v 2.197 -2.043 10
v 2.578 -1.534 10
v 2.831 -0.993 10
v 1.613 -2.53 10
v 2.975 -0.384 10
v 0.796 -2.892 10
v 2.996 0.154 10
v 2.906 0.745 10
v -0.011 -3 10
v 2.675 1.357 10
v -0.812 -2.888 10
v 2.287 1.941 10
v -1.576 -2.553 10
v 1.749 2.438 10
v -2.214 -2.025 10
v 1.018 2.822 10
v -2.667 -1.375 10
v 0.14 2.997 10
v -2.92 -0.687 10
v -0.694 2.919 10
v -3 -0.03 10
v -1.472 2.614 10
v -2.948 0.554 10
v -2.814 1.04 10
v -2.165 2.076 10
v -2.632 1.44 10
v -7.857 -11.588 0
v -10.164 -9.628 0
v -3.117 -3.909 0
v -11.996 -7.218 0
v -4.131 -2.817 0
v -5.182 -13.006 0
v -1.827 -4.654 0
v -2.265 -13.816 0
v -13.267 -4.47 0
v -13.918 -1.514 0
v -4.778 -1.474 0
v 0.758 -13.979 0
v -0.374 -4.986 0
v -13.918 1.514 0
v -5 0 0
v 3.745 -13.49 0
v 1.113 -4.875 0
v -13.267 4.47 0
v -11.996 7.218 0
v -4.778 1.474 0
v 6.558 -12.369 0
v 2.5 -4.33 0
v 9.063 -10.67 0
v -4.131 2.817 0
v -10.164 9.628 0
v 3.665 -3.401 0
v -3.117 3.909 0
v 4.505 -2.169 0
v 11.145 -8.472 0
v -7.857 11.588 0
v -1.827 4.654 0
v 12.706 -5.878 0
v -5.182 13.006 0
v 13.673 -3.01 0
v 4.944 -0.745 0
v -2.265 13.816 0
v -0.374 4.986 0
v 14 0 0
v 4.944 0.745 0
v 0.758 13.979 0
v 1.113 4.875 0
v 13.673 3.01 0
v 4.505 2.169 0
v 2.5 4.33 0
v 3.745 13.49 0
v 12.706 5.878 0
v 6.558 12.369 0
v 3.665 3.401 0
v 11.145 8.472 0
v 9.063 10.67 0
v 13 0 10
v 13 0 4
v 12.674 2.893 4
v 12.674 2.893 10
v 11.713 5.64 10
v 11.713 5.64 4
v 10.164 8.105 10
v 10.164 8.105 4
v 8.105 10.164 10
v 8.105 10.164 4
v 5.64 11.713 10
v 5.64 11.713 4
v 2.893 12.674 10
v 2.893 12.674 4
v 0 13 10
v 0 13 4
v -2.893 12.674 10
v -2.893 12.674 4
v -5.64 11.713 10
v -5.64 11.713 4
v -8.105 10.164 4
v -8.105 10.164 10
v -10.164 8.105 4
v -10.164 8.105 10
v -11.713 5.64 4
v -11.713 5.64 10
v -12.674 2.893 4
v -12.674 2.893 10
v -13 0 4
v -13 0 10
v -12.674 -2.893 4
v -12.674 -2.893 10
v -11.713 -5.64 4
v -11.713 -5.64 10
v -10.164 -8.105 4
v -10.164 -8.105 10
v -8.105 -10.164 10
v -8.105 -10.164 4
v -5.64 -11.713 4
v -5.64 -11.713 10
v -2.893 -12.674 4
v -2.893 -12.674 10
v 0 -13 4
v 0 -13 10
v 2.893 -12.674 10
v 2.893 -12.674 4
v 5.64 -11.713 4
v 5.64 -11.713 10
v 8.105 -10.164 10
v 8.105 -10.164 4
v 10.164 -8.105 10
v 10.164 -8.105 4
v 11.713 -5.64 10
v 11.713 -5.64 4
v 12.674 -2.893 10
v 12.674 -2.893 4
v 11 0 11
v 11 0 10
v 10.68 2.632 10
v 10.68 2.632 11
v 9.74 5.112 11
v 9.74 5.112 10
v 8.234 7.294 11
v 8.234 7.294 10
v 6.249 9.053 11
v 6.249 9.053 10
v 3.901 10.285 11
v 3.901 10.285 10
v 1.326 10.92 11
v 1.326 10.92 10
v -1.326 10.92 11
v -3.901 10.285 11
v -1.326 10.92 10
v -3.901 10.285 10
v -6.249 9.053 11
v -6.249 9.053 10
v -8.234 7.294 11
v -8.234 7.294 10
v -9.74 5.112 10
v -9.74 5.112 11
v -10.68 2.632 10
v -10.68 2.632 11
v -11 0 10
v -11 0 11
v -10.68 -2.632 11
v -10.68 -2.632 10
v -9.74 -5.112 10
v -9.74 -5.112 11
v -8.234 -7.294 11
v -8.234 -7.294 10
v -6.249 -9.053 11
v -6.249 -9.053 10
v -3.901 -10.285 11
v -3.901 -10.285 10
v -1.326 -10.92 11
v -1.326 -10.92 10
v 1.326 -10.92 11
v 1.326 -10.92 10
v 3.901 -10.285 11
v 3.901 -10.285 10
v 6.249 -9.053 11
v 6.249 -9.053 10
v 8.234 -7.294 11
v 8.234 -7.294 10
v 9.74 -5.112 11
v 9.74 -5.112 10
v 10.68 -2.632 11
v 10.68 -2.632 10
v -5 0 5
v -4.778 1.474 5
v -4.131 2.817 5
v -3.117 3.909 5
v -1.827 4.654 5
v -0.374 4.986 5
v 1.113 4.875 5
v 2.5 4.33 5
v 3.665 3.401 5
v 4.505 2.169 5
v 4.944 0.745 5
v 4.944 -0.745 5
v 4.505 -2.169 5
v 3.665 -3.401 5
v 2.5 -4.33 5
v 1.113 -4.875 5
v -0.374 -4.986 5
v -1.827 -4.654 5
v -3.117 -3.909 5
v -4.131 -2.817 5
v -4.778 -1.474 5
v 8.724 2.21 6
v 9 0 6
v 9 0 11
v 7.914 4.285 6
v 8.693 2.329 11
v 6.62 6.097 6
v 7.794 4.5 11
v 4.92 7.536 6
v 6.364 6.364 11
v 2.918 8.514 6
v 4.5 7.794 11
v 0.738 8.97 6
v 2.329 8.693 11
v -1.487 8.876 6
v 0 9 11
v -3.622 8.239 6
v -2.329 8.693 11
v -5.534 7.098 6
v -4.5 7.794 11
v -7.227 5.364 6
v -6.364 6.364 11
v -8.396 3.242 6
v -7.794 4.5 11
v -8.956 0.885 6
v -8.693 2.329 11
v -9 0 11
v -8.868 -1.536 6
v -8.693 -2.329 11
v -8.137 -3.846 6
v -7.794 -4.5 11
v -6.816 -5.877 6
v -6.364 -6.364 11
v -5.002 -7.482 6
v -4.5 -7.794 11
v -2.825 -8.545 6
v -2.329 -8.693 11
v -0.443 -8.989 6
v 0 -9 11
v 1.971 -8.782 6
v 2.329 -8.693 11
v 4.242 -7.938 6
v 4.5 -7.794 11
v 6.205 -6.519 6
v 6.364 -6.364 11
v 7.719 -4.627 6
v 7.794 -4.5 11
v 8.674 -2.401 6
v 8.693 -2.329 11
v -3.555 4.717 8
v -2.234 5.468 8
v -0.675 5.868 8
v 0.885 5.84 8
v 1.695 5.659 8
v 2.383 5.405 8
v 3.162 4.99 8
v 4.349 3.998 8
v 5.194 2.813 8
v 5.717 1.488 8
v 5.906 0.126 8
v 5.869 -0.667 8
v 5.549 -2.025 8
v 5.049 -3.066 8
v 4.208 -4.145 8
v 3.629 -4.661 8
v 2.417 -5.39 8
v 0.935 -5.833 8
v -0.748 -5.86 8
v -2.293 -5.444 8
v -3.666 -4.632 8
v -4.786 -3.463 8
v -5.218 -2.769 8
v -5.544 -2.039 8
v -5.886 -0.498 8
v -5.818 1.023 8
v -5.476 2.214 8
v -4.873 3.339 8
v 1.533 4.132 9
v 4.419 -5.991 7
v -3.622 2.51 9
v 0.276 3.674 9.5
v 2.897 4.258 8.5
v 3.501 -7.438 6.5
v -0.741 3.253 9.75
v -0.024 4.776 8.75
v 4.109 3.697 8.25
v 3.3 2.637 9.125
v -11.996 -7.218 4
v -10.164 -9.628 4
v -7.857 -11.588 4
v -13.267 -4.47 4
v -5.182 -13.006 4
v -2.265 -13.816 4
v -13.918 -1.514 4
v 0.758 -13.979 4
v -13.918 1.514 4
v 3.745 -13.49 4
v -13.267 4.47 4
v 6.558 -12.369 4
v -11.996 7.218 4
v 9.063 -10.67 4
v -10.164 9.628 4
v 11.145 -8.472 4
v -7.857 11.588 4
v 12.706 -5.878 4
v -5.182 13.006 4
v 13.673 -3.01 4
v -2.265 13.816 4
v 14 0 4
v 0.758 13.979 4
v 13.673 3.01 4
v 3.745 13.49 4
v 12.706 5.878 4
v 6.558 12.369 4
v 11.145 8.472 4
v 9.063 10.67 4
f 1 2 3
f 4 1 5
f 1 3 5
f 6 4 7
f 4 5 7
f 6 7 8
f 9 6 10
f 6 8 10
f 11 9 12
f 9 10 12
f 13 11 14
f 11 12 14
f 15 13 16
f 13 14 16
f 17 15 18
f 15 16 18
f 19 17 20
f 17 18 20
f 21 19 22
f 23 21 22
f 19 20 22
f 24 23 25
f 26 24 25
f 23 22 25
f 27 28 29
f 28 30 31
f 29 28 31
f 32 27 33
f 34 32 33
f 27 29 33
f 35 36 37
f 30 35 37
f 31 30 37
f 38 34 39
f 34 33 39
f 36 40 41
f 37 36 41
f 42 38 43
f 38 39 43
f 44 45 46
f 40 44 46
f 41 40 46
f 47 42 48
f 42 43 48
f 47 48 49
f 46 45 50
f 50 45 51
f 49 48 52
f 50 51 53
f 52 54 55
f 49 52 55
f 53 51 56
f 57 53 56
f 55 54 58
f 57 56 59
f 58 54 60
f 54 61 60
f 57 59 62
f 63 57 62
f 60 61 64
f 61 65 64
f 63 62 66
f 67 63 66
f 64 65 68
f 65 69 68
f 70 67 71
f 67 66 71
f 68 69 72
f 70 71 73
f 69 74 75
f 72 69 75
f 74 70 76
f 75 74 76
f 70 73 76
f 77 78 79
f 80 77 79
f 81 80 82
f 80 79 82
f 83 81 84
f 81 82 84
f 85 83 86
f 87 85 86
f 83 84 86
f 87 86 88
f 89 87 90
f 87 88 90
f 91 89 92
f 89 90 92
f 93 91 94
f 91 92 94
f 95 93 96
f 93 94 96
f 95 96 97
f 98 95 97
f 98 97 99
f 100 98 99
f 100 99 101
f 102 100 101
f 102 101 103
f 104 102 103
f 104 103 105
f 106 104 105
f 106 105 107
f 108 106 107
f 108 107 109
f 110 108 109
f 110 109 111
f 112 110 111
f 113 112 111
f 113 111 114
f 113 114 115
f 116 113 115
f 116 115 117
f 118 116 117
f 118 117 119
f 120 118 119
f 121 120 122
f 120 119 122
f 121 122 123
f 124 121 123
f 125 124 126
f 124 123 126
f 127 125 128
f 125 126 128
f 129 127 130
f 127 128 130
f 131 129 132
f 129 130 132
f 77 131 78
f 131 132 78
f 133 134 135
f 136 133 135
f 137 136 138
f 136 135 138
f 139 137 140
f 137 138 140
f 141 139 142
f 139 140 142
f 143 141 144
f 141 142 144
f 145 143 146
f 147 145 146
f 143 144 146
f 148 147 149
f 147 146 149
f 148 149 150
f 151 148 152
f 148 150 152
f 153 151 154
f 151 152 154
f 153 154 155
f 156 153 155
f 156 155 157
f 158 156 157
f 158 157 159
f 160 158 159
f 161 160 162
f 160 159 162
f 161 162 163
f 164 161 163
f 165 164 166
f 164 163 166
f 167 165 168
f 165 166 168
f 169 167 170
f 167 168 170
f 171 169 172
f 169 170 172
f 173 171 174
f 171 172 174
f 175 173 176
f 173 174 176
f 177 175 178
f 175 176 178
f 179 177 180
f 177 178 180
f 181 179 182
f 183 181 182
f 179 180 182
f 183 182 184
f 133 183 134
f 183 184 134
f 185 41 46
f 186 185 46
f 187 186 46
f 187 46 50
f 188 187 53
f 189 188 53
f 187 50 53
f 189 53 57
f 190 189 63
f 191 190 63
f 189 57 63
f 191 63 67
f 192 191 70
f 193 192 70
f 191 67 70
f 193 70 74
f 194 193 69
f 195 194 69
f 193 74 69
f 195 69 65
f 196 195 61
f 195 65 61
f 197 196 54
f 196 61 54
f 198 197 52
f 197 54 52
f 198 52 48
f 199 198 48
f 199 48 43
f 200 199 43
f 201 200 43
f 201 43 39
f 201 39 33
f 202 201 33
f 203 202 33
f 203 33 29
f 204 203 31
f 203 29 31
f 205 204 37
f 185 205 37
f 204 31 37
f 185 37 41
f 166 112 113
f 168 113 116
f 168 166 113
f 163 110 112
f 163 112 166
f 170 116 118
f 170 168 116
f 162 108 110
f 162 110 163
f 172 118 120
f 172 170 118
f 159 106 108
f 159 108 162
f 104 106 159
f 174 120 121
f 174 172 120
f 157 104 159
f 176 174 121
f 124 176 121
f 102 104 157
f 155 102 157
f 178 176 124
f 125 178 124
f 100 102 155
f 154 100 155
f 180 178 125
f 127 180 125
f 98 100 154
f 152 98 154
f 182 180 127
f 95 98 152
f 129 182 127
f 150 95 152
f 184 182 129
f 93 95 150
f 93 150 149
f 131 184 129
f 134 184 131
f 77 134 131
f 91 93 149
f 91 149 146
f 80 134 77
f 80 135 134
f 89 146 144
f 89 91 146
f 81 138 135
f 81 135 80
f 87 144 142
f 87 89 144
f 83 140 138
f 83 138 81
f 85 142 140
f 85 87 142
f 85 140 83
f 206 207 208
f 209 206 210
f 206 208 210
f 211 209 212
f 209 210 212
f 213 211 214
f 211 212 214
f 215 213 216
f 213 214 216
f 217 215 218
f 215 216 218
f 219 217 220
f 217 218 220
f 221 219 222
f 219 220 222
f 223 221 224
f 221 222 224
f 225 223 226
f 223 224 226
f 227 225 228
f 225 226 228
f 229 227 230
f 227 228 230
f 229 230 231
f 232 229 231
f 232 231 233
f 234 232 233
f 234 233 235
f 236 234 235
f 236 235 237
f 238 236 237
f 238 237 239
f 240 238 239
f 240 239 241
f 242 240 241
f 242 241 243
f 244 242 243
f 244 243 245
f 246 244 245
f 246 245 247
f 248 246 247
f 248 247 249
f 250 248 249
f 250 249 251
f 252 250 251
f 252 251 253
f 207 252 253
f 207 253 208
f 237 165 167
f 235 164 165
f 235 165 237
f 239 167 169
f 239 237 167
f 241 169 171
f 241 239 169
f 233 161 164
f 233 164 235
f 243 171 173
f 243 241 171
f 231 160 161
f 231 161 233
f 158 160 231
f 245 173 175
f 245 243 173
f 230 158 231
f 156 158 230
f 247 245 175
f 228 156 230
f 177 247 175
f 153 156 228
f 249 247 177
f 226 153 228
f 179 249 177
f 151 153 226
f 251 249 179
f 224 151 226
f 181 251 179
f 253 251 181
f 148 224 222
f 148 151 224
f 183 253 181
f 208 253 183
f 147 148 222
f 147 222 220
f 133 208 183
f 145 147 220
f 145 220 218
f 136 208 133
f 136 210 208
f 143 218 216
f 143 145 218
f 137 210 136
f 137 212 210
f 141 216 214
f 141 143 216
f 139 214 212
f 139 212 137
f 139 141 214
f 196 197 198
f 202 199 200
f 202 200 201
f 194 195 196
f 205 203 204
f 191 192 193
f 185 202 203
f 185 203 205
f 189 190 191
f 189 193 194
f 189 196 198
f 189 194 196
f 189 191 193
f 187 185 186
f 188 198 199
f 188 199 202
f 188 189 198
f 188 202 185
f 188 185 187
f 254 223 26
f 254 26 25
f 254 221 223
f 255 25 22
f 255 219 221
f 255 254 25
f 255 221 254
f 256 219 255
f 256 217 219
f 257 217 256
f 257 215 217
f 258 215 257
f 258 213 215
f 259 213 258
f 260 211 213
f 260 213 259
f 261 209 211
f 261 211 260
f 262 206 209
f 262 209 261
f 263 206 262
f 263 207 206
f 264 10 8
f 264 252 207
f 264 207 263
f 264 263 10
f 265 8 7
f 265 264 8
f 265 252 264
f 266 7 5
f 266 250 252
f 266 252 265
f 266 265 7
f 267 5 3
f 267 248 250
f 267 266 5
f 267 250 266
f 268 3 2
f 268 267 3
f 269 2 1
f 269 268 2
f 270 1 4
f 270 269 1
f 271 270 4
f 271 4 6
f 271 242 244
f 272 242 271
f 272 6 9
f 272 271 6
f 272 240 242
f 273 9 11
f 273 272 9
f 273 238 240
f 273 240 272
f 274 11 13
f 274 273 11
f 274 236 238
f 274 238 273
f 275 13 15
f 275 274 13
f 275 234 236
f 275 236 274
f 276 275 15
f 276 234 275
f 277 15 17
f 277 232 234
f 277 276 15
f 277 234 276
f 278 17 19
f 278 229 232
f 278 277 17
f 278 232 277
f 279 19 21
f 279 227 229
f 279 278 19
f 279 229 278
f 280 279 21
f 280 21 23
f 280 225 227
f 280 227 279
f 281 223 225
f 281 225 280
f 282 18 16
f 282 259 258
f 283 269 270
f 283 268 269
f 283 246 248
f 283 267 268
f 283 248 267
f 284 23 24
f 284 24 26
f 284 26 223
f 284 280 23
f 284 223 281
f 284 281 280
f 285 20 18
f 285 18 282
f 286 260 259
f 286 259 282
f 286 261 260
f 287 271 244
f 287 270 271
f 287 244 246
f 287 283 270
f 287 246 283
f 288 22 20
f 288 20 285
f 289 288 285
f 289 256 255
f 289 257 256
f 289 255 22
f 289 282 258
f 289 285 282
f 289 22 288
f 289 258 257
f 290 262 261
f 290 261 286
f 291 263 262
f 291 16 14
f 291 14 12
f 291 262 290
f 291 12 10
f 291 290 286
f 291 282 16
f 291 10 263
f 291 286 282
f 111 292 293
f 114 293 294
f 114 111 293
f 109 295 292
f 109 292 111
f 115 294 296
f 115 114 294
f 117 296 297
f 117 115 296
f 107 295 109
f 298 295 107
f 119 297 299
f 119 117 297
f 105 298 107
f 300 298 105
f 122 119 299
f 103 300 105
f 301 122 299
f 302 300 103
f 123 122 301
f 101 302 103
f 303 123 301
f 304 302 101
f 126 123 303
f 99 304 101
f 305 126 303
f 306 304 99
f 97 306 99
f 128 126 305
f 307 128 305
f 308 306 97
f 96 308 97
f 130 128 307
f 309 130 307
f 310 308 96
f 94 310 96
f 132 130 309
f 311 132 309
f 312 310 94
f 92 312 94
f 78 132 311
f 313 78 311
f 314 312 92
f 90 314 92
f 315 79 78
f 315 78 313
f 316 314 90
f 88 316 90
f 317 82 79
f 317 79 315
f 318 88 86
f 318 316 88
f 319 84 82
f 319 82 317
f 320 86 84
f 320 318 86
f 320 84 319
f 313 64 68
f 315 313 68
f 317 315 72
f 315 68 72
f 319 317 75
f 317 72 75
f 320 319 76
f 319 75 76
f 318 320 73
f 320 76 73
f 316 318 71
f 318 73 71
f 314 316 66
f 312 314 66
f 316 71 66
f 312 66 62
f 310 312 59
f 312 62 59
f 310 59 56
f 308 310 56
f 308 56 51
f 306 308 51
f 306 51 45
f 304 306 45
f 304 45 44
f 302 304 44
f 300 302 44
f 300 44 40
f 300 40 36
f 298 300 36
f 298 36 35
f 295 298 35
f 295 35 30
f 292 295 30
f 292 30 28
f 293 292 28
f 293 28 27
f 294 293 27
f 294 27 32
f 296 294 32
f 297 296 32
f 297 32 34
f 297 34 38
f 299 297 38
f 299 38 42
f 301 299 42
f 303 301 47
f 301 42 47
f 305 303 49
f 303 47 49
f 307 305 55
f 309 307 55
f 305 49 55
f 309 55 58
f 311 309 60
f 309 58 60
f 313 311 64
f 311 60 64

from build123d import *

# Parameters (mm, degrees)
SKETCH1_R           = 14
BOSS_EXTRUDE1_DEPTH = 11
CUT_EXTRUDE1_START  = -7
SKETCH2_R           = 14
SKETCH2_R_2         = 13
CUT_EXTRUDE1_DEPTH  = 7
CUT_EXTRUDE2_START  = -1
SKETCH3_R           = 13
SKETCH3_R_2         = 11
CUT_EXTRUDE2_DEPTH  = 1
SKETCH4_R           = 9
CUT_EXTRUDE3_DEPTH  = 5
SKETCH5_R           = 5
CUT_EXTRUDE4_DEPTH  = 5


with BuildPart() as part:
    # Sketch1 → Boss-Extrude1 (new body)
    with BuildSketch(Plane.XY):
        Circle(SKETCH1_R)
    extrude(amount=BOSS_EXTRUDE1_DEPTH)

    # Sketch2 → Cut-Extrude1 (cut)
    with BuildSketch(Plane.XY.offset(11).offset(CUT_EXTRUDE1_START)):
        Circle(SKETCH2_R)
        Circle(SKETCH2_R_2, mode=Mode.SUBTRACT)
    extrude(amount=CUT_EXTRUDE1_DEPTH, mode=Mode.SUBTRACT)

    # Sketch3 → Cut-Extrude2 (cut)
    with BuildSketch(Plane.XY.offset(11).offset(CUT_EXTRUDE2_START)):
        Circle(SKETCH3_R)
        Circle(SKETCH3_R_2, mode=Mode.SUBTRACT)
    extrude(amount=CUT_EXTRUDE2_DEPTH, mode=Mode.SUBTRACT)

    # Sketch4 → Cut-Extrude3 (cut)
    with BuildSketch(Plane.XY.offset(11)):
        Circle(SKETCH4_R)
    extrude(amount=-CUT_EXTRUDE3_DEPTH, mode=Mode.SUBTRACT)

    # Sketch5 → Cut-Extrude4 (cut)
    with BuildSketch(Plane(origin=(0, 0, 0), x_dir=(-1, 0, 0), z_dir=(0, 0, -1))):
        Circle(SKETCH5_R)
    extrude(amount=-CUT_EXTRUDE4_DEPTH, mode=Mode.SUBTRACT)

    # Loft1: read off the stored shape, not the designer's step
    # Loft1: loft between two sections, ruled curve by curve
    loft1_from = [
        Edge.make_bspline([(-2.631639621, 1.44030306, 10), (0.248966499, 6.703582302, 10), (5.512245741, 3.822976182, 10), (2.631639621, -1.44030306, 10), (-0.248966499, -6.703582302, 10), (-5.512245741, -3.822976182, 10), (-2.631639621, 1.44030306, 10)], [0, 0, 0, 0, 0.5, 0.5, 0.5, 1, 1, 1, 1], 3, [1, 0.333333333, 0.333333333, 1, 0.333333333, 0.333333333, 1]),
    ]
    loft1_to = [
        Edge.make_bspline([(-5.534018928, 7.097509035, 6), (8.660999143, 18.165546891, 6), (19.729036998, 3.97052882, 6), (5.534018928, -7.097509035, 6), (-8.660999143, -18.165546891, 6), (-19.729036998, -3.97052882, 6), (-5.534018928, 7.097509035, 6)], [0, 0, 0, 0, 0.5, 0.5, 0.5, 1, 1, 1, 1], 3, [1, 0.333333333, 0.333333333, 1, 0.333333333, 0.333333333, 1]),
    ]
    loft1 = Solid(Shell([*[Face.make_surface_from_curves(loft1_from[k], loft1_to[k]) for k in range(1)], Face(Wire(loft1_from)), Face(Wire(loft1_to))]))
    add(loft1)


solid = part.part
